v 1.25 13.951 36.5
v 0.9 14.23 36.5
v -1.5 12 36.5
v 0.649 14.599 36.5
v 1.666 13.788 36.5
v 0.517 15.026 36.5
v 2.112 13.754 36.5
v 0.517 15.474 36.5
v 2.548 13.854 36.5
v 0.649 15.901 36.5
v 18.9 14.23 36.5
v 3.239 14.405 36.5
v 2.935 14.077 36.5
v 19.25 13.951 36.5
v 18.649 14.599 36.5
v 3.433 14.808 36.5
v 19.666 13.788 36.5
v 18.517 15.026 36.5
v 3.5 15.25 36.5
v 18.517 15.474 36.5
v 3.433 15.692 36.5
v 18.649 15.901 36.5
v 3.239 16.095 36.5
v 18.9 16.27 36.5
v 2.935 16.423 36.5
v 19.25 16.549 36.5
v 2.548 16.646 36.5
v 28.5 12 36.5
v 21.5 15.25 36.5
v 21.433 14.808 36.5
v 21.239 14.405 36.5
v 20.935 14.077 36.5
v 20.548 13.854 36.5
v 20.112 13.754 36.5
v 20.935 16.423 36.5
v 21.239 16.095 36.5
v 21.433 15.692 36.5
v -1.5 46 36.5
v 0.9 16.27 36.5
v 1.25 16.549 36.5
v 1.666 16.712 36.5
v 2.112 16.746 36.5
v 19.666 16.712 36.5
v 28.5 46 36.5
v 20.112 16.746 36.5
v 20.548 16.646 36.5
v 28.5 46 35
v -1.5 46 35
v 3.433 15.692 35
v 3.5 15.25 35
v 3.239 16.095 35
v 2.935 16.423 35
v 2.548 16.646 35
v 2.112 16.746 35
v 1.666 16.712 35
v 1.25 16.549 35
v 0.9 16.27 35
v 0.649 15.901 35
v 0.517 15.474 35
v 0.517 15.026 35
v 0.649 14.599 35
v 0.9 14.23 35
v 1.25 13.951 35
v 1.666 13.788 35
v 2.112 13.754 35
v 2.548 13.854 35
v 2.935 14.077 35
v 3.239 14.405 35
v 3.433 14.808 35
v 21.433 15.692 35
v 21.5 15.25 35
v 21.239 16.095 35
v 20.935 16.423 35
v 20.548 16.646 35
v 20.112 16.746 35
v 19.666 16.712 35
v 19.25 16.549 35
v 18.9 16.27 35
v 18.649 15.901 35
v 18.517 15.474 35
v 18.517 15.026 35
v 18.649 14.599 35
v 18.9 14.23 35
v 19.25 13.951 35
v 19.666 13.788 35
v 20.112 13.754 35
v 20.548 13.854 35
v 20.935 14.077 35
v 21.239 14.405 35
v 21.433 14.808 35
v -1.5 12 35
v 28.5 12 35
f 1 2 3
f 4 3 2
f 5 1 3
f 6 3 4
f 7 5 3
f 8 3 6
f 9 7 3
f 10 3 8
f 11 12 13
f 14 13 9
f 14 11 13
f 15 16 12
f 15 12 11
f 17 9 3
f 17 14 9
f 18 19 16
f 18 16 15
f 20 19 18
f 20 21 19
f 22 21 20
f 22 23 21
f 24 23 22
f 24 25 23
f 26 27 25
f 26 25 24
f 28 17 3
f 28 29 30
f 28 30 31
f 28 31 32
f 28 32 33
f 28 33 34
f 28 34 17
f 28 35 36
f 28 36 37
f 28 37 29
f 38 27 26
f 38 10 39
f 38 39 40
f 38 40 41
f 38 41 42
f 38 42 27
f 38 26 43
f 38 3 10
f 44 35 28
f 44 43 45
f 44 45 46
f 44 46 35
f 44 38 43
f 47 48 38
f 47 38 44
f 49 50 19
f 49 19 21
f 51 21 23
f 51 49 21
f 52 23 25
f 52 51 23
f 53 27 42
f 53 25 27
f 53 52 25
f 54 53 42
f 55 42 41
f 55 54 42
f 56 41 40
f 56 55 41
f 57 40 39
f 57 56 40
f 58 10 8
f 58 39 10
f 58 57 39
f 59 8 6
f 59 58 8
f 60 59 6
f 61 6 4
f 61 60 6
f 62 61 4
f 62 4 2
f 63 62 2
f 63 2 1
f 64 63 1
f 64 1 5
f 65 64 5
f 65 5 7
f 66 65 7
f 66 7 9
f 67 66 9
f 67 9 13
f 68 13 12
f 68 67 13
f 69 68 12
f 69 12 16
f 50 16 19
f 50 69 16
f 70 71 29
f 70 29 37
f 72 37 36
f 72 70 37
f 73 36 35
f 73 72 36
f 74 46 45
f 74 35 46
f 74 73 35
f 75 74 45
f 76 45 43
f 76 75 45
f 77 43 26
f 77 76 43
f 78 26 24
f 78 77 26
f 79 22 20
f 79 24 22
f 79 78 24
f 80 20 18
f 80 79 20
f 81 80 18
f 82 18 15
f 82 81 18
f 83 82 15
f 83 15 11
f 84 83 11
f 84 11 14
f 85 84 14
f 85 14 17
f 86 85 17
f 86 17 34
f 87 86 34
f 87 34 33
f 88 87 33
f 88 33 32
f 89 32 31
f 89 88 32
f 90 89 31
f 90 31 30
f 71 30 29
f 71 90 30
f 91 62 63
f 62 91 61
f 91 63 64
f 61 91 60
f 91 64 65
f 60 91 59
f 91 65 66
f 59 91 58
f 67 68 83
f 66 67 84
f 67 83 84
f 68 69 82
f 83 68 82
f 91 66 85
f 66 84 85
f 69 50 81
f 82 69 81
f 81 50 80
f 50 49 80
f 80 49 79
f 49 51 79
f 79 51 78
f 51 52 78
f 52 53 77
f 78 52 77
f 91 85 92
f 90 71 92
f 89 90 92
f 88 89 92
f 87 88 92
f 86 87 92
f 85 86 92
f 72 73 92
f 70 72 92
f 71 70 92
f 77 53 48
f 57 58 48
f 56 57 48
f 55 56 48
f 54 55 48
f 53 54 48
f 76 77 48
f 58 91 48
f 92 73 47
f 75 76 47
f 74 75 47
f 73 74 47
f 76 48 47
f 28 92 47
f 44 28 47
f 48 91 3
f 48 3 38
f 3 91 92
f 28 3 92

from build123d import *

# Parameters (mm, degrees)
CYLINDER016_R     = 1.5
CYLINDER016_DEPTH = 20
CYLINDER017_R     = 1.5
CYLINDER017_DEPTH = 20
BOX006_W          = 30
BOX006_H          = 34
BOX006_DEPTH      = 1.5


with BuildPart() as cylinder016:
    # Cylinder016 → Cylinder016 (new body)
    with BuildSketch(Plane(origin=(2, 15.25, 20), x_dir=(1, 0, 0), z_dir=(0, 0, 1))):
        Circle(CYLINDER016_R)
    extrude(amount=CYLINDER016_DEPTH)


with BuildPart() as fusion004:
    # Cylinder017 → Cylinder017 (new body)
    with BuildSketch(Plane(origin=(20, 15.25, 20), x_dir=(1, 0, 0), z_dir=(0, 0, 1))):
        Circle(CYLINDER017_R)
    extrude(amount=CYLINDER017_DEPTH)

    # Fusion004: union Cylinder016
    add(cylinder016.part)


with BuildPart() as sup_gps_b:
    # Box006 → Box006 (new body)
    with BuildSketch(Plane(origin=(-1.5, 12, 35), x_dir=(1, 0, 0), z_dir=(0, 0, 1))):
        with Locations((15, 17)):
            Rectangle(BOX006_W, BOX006_H)
    extrude(amount=BOX006_DEPTH)

    # Cut004: cut Fusion004
    add(fusion004.part, mode=Mode.SUBTRACT)


solid = sup_gps_b.part
